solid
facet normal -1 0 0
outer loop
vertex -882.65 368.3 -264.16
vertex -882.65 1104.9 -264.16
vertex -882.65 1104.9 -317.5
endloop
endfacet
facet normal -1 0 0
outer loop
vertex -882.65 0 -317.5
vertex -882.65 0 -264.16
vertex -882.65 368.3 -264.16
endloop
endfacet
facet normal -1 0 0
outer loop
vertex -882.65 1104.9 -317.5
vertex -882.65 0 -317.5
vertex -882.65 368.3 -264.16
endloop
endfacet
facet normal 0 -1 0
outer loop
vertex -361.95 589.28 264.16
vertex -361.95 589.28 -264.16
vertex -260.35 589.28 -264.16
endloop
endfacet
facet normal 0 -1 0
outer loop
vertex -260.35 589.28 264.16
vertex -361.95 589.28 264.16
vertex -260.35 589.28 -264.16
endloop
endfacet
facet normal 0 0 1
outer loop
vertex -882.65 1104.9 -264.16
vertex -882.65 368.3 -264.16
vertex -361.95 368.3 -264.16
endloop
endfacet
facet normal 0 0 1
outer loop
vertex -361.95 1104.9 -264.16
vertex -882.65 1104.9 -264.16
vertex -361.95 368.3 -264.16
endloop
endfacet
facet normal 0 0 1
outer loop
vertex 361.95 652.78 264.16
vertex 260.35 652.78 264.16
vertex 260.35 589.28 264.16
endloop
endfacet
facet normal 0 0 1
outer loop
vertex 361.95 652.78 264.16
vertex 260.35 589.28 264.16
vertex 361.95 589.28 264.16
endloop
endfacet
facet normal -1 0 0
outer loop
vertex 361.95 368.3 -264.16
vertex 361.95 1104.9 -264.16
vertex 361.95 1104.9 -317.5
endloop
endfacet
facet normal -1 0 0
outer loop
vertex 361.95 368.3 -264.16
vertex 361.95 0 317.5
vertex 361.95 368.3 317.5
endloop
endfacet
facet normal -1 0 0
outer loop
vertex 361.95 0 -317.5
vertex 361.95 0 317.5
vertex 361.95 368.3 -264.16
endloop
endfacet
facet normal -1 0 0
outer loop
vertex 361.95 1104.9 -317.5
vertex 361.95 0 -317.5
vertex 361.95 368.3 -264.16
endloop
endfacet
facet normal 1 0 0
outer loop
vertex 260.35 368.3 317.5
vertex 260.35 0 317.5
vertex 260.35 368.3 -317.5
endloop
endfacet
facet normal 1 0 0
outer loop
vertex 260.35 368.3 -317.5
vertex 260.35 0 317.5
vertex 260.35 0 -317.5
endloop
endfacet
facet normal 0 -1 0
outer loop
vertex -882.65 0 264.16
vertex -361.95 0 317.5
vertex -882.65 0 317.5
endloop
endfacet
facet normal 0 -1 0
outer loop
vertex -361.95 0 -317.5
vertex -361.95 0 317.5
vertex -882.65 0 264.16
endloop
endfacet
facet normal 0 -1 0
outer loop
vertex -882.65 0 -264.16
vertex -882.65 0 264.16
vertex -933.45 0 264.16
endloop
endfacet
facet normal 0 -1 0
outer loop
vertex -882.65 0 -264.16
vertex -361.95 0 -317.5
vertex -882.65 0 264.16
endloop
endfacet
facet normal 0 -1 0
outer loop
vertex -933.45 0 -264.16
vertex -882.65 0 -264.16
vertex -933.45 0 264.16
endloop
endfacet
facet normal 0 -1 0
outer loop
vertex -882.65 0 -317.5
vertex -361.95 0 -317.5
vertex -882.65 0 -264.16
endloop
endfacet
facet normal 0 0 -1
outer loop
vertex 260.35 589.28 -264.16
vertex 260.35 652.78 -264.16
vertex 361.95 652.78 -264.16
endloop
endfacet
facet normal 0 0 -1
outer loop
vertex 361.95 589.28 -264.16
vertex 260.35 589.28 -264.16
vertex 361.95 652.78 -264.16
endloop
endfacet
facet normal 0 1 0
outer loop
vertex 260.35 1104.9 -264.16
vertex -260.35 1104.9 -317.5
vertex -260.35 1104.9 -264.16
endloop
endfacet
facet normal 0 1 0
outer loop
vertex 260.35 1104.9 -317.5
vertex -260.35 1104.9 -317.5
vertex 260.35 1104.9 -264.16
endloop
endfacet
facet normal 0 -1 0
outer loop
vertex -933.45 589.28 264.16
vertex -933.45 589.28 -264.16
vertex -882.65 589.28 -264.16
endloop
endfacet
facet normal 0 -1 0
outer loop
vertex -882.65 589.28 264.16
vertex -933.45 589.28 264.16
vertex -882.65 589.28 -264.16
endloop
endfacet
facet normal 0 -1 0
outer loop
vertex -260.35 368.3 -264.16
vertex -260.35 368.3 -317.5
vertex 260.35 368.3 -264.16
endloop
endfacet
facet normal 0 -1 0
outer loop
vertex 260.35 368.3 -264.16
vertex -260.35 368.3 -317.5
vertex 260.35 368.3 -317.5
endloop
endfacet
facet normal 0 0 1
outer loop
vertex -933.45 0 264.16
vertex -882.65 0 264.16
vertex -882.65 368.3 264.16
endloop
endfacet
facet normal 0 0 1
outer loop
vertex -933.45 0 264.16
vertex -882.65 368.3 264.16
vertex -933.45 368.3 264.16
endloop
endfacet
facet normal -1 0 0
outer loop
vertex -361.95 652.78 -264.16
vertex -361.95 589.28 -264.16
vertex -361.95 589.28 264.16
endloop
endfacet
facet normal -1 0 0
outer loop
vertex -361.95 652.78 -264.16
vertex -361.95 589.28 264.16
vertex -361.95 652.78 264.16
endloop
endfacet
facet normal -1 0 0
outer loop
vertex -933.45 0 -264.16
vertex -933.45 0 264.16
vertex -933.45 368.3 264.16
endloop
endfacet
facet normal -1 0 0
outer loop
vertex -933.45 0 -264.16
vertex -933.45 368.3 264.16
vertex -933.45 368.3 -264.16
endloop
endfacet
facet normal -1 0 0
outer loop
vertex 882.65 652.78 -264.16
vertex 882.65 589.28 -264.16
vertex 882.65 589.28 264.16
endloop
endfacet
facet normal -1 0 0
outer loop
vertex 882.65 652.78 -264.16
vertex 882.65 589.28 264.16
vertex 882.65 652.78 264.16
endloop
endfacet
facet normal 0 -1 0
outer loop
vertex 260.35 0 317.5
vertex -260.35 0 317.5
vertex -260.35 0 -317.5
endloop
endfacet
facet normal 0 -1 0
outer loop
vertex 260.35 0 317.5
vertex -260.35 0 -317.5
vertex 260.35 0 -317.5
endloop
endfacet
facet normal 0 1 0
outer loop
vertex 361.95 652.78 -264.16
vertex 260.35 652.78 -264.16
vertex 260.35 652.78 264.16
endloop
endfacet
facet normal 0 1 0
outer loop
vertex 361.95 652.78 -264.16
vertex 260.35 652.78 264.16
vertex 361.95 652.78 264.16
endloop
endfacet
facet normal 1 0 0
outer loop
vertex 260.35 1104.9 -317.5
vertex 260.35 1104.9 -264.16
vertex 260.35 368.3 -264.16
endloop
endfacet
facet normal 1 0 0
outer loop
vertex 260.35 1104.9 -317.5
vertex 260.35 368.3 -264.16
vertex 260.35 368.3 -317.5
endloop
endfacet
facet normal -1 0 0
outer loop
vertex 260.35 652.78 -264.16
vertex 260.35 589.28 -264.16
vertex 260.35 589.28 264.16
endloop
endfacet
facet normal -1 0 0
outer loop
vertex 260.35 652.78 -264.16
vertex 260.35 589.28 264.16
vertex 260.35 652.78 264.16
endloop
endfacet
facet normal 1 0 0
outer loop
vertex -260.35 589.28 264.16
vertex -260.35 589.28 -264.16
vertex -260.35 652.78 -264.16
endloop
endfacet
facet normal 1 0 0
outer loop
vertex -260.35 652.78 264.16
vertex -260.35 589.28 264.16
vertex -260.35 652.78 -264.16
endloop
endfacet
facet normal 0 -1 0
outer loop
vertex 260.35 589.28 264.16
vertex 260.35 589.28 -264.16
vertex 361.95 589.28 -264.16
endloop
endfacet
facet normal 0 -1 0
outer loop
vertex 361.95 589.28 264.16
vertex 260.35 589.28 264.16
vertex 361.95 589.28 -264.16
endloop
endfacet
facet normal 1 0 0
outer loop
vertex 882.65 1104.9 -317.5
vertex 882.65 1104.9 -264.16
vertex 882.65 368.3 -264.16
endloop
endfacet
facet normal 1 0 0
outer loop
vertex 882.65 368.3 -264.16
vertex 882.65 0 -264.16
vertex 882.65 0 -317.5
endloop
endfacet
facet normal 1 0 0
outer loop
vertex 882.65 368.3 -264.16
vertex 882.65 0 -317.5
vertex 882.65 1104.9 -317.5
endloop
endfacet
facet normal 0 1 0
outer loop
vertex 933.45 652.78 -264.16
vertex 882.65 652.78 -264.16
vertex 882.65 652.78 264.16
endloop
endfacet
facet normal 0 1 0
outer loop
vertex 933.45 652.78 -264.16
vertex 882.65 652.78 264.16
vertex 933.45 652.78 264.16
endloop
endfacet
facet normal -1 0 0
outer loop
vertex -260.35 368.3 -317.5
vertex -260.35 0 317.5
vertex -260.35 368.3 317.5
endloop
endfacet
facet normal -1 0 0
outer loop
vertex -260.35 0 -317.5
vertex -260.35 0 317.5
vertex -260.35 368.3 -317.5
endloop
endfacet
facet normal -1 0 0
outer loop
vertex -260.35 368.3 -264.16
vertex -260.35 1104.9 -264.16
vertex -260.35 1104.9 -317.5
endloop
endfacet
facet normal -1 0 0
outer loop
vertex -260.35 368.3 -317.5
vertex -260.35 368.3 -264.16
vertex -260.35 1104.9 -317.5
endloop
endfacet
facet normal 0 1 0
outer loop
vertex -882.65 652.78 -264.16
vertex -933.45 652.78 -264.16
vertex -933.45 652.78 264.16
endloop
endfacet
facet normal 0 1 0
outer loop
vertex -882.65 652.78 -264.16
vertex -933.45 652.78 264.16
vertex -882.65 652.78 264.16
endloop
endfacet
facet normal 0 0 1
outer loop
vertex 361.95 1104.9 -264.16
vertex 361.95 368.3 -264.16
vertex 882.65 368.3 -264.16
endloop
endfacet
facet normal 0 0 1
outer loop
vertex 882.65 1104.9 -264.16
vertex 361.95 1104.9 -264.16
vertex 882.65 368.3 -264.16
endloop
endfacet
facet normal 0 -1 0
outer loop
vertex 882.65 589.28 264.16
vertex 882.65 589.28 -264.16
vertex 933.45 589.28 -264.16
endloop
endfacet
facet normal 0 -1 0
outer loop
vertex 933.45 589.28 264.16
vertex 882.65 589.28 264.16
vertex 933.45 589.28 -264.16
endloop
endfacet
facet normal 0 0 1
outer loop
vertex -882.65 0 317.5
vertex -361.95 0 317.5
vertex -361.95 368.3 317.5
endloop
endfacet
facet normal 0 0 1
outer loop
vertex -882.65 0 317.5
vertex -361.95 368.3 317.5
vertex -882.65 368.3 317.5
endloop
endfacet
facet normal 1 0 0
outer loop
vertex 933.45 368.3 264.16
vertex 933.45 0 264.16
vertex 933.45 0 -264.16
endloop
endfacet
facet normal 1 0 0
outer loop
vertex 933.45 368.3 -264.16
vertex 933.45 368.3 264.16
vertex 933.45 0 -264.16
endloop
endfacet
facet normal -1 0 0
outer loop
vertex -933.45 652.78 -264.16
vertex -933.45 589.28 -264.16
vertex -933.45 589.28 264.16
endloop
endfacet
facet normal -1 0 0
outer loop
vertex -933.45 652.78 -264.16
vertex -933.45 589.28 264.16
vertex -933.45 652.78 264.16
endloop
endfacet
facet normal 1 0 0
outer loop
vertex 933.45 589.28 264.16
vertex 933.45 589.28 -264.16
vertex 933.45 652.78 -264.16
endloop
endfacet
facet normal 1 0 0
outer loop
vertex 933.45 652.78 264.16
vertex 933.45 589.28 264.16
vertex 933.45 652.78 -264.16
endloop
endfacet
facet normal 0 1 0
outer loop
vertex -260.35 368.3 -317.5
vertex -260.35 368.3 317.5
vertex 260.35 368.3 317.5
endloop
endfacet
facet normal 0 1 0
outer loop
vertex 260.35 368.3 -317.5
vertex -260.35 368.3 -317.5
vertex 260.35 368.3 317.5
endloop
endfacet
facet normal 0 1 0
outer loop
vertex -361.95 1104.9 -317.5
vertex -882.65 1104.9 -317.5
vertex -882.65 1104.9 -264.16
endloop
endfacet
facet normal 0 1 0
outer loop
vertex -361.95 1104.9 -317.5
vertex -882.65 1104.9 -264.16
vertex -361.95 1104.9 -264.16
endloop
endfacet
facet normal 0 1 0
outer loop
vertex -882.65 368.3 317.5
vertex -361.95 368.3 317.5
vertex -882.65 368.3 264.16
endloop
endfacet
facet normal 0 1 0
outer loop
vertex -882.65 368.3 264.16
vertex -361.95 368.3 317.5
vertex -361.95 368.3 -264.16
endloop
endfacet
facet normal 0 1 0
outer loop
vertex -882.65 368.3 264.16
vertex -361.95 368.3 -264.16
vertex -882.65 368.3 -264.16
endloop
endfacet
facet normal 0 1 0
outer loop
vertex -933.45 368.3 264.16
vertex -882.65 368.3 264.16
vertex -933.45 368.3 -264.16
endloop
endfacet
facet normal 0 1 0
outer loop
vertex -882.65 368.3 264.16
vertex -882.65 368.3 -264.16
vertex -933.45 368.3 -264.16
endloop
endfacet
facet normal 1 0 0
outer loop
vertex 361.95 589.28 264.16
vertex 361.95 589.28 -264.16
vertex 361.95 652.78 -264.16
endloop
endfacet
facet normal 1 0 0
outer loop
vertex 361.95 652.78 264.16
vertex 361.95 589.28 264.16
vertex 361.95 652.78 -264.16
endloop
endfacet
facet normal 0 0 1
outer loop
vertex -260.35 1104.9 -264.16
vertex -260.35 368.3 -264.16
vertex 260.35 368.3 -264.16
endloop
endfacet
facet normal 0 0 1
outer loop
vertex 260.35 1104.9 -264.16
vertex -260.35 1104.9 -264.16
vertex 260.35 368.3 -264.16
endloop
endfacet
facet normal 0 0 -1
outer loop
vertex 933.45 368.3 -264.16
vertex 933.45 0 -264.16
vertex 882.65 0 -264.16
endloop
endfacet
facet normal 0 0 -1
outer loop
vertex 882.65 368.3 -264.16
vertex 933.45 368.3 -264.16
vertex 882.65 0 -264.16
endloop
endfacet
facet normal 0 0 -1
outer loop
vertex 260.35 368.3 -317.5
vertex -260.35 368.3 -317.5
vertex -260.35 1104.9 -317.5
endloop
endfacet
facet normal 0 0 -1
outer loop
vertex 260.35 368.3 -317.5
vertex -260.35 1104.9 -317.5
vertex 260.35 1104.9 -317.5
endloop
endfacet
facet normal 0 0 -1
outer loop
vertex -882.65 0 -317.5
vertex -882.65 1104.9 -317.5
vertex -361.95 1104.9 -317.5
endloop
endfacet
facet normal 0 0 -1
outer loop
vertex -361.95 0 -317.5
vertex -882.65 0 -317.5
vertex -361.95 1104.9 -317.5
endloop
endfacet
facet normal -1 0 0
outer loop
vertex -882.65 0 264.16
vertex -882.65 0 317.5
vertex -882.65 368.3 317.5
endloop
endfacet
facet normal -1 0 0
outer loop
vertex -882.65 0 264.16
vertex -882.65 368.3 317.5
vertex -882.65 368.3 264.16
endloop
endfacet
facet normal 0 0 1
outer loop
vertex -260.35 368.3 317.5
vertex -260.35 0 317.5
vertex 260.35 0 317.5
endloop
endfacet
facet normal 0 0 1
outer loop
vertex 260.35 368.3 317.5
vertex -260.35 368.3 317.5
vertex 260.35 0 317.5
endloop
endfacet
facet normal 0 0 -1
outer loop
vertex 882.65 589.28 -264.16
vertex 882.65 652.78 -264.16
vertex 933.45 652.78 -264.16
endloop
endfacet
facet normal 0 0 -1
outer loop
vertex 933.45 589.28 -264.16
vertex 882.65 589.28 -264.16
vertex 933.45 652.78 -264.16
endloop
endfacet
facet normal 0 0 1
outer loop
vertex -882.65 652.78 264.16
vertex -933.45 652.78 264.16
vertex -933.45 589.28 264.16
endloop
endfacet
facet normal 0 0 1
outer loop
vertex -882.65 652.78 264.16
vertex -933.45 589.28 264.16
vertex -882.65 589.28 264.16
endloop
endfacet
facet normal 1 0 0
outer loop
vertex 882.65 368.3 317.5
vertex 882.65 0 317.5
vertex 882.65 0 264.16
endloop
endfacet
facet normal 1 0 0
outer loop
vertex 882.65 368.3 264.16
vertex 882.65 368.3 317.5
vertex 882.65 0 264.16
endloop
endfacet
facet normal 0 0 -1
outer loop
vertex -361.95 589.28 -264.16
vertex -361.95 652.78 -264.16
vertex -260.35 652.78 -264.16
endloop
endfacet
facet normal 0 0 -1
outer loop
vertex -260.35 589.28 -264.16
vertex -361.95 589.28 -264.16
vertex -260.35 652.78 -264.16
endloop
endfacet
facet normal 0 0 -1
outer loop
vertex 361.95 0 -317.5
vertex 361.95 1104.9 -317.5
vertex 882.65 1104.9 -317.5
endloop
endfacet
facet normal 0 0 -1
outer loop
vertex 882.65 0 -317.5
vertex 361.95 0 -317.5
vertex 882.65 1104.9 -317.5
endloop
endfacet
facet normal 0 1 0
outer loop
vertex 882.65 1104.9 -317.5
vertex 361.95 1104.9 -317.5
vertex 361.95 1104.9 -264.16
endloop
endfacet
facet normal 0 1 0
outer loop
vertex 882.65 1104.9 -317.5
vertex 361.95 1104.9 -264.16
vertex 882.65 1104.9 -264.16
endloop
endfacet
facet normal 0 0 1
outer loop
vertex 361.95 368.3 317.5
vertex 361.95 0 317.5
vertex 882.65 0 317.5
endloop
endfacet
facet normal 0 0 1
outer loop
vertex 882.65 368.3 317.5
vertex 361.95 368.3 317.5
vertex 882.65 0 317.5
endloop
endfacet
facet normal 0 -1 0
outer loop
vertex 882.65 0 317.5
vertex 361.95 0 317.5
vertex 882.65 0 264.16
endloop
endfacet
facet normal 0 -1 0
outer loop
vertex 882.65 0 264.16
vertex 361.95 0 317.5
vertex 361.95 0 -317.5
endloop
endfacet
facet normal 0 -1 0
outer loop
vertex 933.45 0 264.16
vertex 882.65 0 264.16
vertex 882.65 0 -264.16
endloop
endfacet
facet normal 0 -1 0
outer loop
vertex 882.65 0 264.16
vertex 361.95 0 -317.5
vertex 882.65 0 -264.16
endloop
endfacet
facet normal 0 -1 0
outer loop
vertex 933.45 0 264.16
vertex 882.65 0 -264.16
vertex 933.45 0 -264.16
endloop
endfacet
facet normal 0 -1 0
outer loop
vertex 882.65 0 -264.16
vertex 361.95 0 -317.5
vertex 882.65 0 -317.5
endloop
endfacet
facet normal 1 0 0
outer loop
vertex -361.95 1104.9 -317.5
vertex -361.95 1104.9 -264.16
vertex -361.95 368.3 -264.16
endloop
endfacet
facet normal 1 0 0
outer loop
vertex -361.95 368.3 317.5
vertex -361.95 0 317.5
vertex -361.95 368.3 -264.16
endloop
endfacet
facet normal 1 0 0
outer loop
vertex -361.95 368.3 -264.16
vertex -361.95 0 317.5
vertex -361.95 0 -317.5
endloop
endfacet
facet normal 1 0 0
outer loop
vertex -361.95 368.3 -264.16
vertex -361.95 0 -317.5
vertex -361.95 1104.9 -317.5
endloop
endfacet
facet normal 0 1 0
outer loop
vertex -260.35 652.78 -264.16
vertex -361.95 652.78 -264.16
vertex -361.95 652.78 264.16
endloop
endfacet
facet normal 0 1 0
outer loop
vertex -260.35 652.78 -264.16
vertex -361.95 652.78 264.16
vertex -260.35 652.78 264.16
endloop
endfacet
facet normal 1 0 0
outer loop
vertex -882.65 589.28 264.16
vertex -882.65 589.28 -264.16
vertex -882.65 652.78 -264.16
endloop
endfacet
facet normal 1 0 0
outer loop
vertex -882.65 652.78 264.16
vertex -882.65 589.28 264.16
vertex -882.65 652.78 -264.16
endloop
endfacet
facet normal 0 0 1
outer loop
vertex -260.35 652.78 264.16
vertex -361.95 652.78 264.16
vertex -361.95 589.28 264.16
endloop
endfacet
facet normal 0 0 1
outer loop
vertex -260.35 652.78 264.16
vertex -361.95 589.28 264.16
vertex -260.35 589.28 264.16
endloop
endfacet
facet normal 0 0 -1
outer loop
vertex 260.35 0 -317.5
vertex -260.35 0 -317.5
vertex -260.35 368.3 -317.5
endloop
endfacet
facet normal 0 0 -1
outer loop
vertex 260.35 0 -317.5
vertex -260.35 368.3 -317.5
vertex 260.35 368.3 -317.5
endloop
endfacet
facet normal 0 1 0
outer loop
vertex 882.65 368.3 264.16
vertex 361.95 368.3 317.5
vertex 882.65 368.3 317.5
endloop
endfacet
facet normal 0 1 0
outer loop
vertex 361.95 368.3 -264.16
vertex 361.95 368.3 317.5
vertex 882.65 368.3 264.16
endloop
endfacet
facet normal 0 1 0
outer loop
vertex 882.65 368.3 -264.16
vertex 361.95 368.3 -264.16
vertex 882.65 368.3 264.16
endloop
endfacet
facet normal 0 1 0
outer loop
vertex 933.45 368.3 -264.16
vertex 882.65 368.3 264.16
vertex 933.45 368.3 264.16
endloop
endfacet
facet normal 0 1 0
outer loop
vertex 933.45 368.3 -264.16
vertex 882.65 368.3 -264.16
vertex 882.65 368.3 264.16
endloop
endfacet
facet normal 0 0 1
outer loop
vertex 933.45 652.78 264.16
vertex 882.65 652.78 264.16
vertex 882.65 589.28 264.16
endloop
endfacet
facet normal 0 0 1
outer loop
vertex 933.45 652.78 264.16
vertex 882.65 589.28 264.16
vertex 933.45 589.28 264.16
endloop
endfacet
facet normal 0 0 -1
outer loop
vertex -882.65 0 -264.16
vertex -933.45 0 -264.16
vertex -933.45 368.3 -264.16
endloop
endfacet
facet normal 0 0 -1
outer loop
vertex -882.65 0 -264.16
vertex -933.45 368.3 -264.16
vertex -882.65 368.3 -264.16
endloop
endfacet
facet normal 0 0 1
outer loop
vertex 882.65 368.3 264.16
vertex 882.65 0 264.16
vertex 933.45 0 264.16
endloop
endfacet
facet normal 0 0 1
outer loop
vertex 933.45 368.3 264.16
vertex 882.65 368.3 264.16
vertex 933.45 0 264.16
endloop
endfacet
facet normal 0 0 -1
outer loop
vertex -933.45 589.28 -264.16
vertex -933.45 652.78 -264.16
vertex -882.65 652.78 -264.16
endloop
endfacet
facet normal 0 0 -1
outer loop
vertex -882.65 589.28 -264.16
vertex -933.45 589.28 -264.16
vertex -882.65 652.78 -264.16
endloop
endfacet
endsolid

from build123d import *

# Parameters (mm, degrees)
BOSS_EXTRUDE1_DEPTH   = 368.3
BOSS_EXTRUDE1_2_DEPTH = 368.3
SKETCH1_W             = 520.7
SKETCH1_H             = 635
BOSS_EXTRUDE1_3_DEPTH = 368.3
SKETCH2_W             = 520.7
SKETCH2_H             = 53.34
BOSS_EXTRUDE2_DEPTH   = 736.6
SKETCH3_W             = 50.8
SKETCH3_H             = 63.5
BOSS_EXTRUDE3_DEPTH   = 528.32
BOSS_EXTRUDE3_2_DEPTH = 528.32
SKETCH3_W_2           = 101.6
BOSS_EXTRUDE3_3_DEPTH = 528.32
BOSS_EXTRUDE3_4_DEPTH = 528.32


with BuildPart() as part:
    # Sketch1 → Boss-Extrude1 (new body)
    with BuildSketch(Plane(origin=(0, 0, 0), x_dir=(1, 0, 0), z_dir=(0, 1, 0))):
        Polygon((-933.45, 264.16), (-882.65, 264.16), (-882.65, 317.5), (-361.95, 317.5), (-361.95, -317.5), (-882.65, -317.5), (-882.65, -264.16), (-933.45, -264.16), align=None)
    extrude(amount=BOSS_EXTRUDE1_DEPTH)



with BuildPart() as body_2:
    # Sketch1 → Boss-Extrude1 2 (new body)
    with BuildSketch(Plane(origin=(0, 0, 0), x_dir=(1, 0, 0), z_dir=(0, 1, 0))):
        Polygon((361.95, -317.5), (882.65, -317.5), (882.65, -264.16), (933.45, -264.16), (933.45, 264.16), (882.65, 264.16), (882.65, 317.5), (361.95, 317.5), align=None)
    extrude(amount=BOSS_EXTRUDE1_2_DEPTH)


with BuildPart() as body_3:
    # Sketch1 → Boss-Extrude1 3 (new body)
    with BuildSketch(Plane(origin=(0, 0, 0), x_dir=(1, 0, 0), z_dir=(0, 1, 0))):
        Rectangle(SKETCH1_W, SKETCH1_H)
    extrude(amount=BOSS_EXTRUDE1_3_DEPTH)


with BuildPart() as part_1:
    add(part.part)

    add(body_2.part)  # Boss-Extrude2 merges body 2
    # Sketch2 → Boss-Extrude2 (add)
    with BuildSketch(Plane(origin=(0, 368.3, 0), x_dir=(1, 0, 0), z_dir=(0, 1, 0))):
        with Locations((-622.3, 290.83)):
            Rectangle(SKETCH2_W, SKETCH2_H)
        with Locations((622.3, 290.83)):
            Rectangle(SKETCH2_W, SKETCH2_H)
        with Locations((0, 290.83)):
            Rectangle(SKETCH2_W, SKETCH2_H)
    extrude(amount=BOSS_EXTRUDE2_DEPTH)


with BuildPart() as body_3_2:
    # Sketch3 → Boss-Extrude3 (new body)
    with BuildSketch(Plane.XY.offset(-264.16)):
        with Locations((-908.05, 621.03)):
            Rectangle(SKETCH3_W, SKETCH3_H)
    extrude(amount=BOSS_EXTRUDE3_DEPTH)


with BuildPart() as body_4:
    # Sketch3 → Boss-Extrude3 2 (new body)
    with BuildSketch(Plane.XY.offset(-264.16)):
        with Locations((908.05, 621.03)):
            Rectangle(SKETCH3_W, SKETCH3_H)
    extrude(amount=BOSS_EXTRUDE3_2_DEPTH)


with BuildPart() as body_5:
    # Sketch3 → Boss-Extrude3 3 (new body)
    with BuildSketch(Plane.XY.offset(-264.16)):
        with Locations((-311.15, 621.03)):
            Rectangle(SKETCH3_W_2, SKETCH3_H)
    extrude(amount=BOSS_EXTRUDE3_3_DEPTH)


with BuildPart() as body_6:
    # Sketch3 → Boss-Extrude3 4 (new body)
    with BuildSketch(Plane.XY.offset(-264.16)):
        with Locations((311.15, 621.03)):
            Rectangle(SKETCH3_W_2, SKETCH3_H)
    extrude(amount=BOSS_EXTRUDE3_4_DEPTH)


solid = Compound([body_3.part, part_1.part, body_3_2.part, body_4.part, body_5.part, body_6.part])
